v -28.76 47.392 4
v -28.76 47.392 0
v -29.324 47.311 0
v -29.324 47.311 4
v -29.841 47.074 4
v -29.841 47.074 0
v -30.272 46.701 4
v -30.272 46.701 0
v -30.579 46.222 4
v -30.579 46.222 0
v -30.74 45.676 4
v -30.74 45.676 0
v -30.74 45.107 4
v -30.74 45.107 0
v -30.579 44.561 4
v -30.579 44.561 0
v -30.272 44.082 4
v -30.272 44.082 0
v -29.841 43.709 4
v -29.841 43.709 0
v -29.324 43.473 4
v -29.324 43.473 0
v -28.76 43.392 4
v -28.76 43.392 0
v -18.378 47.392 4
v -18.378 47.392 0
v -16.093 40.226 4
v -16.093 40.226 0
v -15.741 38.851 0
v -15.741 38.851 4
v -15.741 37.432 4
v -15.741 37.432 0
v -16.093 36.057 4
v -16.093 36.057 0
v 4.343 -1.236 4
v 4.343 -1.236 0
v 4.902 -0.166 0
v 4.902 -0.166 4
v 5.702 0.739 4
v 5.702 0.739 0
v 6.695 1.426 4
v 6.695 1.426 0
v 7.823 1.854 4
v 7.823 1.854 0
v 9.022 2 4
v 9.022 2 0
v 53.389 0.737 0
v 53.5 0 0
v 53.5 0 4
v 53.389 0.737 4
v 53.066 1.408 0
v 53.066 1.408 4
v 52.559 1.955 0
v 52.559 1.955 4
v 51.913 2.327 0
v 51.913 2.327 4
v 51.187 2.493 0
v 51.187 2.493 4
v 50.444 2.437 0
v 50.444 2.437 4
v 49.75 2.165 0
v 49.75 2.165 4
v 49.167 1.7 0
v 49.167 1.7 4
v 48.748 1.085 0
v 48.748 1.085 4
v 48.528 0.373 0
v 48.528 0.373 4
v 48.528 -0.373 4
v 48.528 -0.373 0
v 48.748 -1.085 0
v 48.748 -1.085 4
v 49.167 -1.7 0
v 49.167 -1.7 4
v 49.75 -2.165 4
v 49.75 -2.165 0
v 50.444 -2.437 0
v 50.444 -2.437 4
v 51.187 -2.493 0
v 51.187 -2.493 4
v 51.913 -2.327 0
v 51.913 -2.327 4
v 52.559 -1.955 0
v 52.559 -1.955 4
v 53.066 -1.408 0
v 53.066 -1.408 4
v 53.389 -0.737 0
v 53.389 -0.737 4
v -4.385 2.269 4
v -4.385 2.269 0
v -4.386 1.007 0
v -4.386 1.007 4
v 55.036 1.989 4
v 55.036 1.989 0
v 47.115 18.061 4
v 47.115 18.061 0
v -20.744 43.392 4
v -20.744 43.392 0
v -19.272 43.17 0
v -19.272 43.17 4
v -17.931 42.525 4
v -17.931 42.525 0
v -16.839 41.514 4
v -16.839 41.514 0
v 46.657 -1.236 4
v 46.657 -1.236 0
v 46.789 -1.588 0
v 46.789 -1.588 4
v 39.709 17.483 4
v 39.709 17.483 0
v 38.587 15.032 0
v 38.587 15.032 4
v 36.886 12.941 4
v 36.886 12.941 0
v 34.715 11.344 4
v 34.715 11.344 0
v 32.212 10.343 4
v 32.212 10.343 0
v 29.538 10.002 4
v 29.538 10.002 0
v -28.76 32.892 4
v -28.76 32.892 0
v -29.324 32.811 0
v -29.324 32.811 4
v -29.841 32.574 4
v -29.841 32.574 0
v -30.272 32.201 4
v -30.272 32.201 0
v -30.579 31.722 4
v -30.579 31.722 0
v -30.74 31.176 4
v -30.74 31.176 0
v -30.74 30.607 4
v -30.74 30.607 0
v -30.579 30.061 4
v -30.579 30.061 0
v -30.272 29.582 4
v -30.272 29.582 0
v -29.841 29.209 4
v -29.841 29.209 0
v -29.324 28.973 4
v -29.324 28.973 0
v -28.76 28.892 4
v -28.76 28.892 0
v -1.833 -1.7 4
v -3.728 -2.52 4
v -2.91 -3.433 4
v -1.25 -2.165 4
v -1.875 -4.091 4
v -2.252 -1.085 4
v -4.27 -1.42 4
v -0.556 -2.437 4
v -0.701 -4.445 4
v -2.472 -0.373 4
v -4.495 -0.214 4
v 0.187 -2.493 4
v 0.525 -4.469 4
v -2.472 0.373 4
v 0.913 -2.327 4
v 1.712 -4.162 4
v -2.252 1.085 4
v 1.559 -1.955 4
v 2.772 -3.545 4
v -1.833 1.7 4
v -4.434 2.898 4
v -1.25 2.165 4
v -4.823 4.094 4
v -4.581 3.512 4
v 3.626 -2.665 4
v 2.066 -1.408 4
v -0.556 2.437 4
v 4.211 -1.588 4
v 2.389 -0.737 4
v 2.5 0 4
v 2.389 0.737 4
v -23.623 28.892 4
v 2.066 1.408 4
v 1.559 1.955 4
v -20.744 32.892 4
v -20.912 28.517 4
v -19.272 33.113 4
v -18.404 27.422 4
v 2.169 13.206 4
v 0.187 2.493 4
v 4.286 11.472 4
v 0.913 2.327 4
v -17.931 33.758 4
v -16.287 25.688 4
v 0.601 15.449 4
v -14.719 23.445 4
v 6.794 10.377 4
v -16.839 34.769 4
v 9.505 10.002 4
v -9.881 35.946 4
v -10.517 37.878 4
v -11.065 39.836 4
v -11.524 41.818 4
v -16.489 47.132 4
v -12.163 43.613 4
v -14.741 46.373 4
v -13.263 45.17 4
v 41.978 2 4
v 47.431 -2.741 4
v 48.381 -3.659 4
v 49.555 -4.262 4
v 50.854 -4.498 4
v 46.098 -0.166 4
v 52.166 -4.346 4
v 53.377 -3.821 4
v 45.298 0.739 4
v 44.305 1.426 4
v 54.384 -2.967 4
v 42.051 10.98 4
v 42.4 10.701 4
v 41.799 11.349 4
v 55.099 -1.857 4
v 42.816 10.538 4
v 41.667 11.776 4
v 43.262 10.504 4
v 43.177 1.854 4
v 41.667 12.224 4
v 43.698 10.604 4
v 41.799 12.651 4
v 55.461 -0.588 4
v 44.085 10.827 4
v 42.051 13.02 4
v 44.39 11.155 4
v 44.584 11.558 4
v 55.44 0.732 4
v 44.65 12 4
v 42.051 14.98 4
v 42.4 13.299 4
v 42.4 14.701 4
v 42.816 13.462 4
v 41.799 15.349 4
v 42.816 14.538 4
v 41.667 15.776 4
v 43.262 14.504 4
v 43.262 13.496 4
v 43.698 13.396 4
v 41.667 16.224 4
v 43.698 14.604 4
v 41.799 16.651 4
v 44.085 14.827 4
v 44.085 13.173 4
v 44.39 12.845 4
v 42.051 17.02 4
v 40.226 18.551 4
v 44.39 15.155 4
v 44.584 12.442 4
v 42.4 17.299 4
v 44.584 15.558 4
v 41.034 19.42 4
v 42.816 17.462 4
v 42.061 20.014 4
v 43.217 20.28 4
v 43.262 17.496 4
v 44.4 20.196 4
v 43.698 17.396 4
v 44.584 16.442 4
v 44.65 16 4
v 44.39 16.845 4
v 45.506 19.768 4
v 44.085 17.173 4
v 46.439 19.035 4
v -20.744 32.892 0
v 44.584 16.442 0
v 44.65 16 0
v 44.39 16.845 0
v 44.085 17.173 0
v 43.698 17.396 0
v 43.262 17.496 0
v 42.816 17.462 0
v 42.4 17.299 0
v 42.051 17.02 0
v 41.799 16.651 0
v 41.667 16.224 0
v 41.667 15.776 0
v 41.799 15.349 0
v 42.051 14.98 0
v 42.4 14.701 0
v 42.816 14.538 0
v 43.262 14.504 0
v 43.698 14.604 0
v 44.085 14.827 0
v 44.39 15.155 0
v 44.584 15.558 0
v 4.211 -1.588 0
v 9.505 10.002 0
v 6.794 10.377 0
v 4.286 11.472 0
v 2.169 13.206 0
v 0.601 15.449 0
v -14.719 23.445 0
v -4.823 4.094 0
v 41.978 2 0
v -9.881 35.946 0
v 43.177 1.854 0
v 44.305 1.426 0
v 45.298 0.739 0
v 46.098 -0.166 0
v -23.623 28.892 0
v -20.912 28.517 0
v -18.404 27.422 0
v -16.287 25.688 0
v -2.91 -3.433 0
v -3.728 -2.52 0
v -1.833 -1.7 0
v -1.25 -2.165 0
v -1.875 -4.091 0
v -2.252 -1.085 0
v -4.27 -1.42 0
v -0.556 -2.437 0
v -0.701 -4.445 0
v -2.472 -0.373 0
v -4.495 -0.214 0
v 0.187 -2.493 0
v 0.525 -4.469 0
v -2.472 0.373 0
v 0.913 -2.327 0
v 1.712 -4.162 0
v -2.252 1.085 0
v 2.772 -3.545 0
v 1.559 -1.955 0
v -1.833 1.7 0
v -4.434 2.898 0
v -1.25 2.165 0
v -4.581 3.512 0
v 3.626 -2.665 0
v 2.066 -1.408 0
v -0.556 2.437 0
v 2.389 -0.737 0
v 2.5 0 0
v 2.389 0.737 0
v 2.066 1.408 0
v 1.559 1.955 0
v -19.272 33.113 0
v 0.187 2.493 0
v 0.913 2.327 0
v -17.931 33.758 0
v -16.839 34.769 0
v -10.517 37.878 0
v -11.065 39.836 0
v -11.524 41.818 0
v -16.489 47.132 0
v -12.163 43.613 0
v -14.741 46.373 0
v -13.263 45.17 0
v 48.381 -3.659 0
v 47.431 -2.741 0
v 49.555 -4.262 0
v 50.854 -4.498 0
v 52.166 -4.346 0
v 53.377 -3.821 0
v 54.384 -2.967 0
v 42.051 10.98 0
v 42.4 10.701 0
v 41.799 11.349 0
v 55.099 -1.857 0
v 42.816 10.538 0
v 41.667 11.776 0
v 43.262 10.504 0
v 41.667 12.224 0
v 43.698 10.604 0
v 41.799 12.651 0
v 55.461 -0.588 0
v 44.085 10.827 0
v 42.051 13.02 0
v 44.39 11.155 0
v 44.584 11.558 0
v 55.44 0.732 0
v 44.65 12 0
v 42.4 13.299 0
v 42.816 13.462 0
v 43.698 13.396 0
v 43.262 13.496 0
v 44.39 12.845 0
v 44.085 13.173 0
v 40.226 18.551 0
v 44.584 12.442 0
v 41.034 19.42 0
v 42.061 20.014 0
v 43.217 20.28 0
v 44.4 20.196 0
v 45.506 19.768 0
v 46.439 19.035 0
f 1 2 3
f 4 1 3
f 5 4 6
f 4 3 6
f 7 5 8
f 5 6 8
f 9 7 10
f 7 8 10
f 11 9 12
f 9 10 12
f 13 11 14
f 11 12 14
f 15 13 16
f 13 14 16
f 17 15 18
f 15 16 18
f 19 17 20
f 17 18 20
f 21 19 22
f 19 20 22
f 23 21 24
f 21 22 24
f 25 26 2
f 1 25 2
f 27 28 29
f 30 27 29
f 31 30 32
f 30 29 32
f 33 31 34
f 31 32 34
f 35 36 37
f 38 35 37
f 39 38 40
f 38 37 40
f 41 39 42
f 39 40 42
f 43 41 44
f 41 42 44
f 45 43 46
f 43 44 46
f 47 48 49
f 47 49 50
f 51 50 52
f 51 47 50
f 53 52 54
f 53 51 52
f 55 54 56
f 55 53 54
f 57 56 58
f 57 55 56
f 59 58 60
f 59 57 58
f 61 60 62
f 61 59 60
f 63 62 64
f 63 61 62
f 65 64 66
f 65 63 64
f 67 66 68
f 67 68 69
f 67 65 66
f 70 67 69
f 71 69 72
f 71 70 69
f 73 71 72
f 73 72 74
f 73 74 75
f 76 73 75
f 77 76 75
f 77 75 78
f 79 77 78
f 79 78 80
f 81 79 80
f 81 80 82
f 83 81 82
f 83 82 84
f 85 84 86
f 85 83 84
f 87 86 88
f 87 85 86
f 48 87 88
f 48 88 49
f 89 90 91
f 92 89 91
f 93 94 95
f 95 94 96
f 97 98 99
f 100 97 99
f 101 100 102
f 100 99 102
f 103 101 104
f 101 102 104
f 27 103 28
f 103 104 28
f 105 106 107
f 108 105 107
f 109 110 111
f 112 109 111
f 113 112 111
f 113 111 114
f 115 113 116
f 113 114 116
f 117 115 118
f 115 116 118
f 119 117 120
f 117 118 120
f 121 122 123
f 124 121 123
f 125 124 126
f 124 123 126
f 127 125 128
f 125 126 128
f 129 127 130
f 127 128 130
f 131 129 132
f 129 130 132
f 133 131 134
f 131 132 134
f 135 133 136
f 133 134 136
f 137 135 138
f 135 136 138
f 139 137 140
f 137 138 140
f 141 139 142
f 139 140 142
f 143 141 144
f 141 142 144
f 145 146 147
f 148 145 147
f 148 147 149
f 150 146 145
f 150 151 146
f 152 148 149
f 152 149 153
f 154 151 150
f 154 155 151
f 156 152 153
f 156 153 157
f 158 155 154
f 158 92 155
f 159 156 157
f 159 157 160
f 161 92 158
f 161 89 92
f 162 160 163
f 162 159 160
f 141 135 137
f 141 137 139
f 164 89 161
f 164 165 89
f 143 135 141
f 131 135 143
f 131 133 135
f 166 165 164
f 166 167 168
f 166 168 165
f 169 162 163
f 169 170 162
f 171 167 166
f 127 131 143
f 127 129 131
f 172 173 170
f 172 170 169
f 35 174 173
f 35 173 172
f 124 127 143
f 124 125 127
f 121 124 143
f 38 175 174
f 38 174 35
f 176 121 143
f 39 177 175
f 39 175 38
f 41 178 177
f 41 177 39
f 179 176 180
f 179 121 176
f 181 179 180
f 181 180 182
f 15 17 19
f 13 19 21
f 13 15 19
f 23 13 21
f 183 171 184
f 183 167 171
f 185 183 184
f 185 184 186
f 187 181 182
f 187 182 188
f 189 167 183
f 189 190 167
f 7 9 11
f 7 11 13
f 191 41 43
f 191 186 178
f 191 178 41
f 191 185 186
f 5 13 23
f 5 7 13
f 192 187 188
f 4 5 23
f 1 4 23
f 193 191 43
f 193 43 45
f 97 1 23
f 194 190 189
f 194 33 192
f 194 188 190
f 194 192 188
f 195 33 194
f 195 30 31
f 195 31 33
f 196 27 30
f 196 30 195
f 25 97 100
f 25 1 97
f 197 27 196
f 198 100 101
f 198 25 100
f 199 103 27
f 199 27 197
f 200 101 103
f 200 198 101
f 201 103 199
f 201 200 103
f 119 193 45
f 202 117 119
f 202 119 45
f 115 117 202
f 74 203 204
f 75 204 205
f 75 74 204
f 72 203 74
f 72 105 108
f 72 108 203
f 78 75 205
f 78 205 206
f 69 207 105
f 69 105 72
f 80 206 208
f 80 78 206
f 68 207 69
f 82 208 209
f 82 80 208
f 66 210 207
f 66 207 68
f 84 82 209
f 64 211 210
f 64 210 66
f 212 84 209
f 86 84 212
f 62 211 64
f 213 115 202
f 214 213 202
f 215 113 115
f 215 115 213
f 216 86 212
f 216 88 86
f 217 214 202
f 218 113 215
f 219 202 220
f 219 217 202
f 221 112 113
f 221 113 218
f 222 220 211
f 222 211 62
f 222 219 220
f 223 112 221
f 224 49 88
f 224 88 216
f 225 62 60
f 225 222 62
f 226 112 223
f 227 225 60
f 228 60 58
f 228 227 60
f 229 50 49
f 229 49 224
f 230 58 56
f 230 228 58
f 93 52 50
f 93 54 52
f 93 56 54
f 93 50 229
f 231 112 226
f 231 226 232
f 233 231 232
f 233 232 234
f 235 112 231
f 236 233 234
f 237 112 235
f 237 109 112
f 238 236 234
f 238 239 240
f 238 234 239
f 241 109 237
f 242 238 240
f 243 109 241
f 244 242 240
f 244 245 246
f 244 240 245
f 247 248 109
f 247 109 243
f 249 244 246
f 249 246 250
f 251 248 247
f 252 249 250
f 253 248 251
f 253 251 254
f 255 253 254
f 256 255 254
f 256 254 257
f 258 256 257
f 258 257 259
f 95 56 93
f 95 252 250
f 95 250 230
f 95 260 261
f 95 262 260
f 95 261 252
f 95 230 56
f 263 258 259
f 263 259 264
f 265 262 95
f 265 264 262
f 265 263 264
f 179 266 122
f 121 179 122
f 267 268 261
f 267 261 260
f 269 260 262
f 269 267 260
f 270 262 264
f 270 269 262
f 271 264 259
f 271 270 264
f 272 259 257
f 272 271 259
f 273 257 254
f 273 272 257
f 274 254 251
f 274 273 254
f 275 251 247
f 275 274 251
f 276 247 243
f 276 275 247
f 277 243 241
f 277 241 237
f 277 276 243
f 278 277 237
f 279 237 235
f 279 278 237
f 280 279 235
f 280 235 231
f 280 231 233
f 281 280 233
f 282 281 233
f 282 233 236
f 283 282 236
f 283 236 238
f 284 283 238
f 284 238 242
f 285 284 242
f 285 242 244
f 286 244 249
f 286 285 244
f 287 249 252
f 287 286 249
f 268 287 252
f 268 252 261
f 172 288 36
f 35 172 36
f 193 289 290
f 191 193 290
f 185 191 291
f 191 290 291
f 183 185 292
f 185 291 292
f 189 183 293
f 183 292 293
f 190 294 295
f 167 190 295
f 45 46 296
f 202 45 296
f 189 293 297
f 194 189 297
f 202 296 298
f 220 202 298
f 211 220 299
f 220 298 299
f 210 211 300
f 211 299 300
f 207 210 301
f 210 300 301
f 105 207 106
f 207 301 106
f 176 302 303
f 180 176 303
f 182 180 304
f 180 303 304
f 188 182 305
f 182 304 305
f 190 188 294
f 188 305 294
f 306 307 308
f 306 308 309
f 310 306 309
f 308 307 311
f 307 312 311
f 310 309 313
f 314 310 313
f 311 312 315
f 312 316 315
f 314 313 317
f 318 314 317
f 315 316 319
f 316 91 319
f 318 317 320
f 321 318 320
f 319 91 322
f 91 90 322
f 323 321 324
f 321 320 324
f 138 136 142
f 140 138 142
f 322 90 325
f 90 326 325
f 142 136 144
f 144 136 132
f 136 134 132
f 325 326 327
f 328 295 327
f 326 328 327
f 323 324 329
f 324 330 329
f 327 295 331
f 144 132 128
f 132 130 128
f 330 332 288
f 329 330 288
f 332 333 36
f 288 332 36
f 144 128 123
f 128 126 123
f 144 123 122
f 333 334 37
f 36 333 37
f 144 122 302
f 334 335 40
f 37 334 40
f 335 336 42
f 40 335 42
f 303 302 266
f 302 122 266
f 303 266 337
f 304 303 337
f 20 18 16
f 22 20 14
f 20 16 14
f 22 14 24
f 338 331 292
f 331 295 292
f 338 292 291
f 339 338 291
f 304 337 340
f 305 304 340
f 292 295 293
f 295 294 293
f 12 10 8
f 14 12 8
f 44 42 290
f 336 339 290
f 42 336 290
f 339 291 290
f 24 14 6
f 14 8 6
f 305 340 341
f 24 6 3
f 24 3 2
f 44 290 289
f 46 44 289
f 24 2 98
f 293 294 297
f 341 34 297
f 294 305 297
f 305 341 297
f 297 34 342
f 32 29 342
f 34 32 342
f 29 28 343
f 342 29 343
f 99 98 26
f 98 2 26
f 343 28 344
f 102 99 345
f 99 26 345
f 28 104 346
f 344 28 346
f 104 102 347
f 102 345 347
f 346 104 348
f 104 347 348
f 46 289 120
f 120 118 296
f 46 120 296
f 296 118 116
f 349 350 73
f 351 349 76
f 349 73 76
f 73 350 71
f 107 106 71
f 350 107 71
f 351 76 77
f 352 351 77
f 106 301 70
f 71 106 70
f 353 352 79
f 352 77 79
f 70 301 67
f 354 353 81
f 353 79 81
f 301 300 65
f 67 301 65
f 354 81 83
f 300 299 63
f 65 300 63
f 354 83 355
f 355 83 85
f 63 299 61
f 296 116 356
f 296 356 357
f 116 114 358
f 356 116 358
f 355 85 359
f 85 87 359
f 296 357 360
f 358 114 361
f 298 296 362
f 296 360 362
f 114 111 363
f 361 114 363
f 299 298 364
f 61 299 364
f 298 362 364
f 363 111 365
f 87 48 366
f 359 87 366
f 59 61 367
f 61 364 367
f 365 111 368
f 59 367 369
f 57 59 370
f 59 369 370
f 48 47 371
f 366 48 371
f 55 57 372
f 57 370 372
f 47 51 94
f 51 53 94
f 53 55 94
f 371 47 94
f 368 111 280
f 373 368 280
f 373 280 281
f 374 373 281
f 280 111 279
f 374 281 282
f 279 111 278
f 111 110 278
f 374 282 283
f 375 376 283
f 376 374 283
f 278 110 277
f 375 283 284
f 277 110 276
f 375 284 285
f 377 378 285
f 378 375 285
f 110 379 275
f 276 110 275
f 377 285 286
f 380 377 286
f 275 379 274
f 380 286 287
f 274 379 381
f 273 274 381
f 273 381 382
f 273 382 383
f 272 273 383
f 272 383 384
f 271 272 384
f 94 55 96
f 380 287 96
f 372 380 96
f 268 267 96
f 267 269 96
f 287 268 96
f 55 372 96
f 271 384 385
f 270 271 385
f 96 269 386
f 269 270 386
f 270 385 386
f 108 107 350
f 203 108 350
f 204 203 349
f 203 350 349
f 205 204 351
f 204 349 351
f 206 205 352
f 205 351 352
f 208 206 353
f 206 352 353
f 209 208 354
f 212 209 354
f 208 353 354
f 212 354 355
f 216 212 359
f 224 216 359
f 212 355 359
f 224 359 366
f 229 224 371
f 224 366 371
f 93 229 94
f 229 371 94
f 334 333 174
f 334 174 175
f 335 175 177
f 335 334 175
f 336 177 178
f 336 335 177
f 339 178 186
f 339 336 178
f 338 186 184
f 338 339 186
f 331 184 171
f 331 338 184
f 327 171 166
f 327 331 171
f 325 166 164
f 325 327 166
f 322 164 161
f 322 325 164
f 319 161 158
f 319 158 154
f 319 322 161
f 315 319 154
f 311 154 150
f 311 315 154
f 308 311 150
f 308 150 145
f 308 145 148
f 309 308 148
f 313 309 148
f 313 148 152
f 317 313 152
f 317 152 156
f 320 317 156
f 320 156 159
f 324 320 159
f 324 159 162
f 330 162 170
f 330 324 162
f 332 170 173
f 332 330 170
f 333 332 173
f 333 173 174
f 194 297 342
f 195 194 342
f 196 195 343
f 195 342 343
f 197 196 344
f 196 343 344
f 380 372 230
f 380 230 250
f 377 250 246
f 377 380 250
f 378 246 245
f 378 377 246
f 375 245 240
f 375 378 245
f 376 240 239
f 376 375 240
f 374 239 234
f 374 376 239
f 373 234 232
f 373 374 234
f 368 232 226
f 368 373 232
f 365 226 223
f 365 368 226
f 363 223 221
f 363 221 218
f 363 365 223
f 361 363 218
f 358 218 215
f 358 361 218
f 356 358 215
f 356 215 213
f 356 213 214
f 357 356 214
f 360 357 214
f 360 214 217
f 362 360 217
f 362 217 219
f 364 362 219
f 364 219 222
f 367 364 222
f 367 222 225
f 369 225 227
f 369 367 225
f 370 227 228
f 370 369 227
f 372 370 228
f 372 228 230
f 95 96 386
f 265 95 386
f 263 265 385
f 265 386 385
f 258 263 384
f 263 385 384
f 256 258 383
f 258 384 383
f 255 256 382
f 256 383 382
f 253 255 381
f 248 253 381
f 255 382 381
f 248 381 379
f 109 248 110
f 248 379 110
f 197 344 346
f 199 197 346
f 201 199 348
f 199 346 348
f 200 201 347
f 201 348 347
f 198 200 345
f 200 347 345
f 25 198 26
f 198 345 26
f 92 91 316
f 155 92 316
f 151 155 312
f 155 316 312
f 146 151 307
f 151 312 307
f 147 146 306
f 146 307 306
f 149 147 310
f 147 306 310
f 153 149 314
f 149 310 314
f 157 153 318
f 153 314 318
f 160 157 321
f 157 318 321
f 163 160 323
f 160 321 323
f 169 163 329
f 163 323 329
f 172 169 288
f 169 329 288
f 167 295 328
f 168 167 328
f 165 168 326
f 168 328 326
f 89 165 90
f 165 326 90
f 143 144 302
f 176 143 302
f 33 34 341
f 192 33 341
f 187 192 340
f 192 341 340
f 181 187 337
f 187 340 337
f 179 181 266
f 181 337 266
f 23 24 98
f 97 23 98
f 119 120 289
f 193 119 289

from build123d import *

# Parameters (mm, degrees)
SKETCH1_R           = 2.5
SKETCH1_R_2         = 1.5
BOSS_EXTRUDE1_DEPTH = 4


with BuildPart() as part:
    # Sketch1 → Boss-Extrude1 (new body)
    with BuildSketch(Plane.XY):
        with BuildLine():
            Line((9.021718503, 2), (41.978281497, 2))
            ThreePointArc((41.978281497, 2), (44.822515117, 1.112217786), (46.656724728, -1.235865953))
            Line((46.656724728, -1.235865953), (46.789401092, -1.587720642))
            ThreePointArc((46.789401092, -1.587720642), (52.790694487, -4.128366899), (55.036357188, 1.989427216))
            Line((55.036357188, 1.989427216), (47.115238631, 18.060617738))
            ThreePointArc((47.115238631, 18.060617738), (43.216566444, 20.280145198), (39.708839684, 17.483397096))
            ThreePointArc((39.708839684, 17.483397096), (35.851166353, 12.07387553), (29.538291134, 10.002119376))
            Line((29.538291134, 10.002119376), (9.504810122, 10.002119376))
            ThreePointArc((9.504810122, 10.002119376), (4.286155076, 11.471841566), (0.601494655, 15.448991475))
            Line((0.601494655, 15.448991475), (-9.880645528, 35.94606576))
            ThreePointArc((-9.880645528, 35.94606576), (-10.802085001, 38.853975504), (-11.524402661, 41.817629833))
            ThreePointArc((-11.524402661, 41.817629833), (-13.960734342, 45.822125323), (-18.377595021, 47.391532194))
            Line((-18.377595021, 47.391532194), (-28.76016905, 47.391532194))
            ThreePointArc((-28.76016905, 47.391532194), (-30.76016905, 45.391532194), (-28.76016905, 43.391532194))
            Line((-28.76016905, 43.391532194), (-20.743770069, 43.391532194))
            ThreePointArc((-20.743770069, 43.391532194), (-17.93067591, 42.525114327), (-16.092507767, 40.226132695))
            ThreePointArc((-16.092507767, 40.226132695), (-15.696247775, 38.141532194), (-16.092507767, 36.056931692))
            ThreePointArc((-16.092507767, 36.056931692), (-17.93067591, 33.75795006), (-20.743770069, 32.891532194))
            Line((-20.743770069, 32.891532194), (-23.62255188, 32.891532194))
            Line((-23.62255188, 32.891532194), (-28.76016905, 32.891532194))
            ThreePointArc((-28.76016905, 32.891532194), (-30.76016905, 30.891532194), (-28.76016905, 28.891532194))
            Line((-28.76016905, 28.891532194), (-23.62255188, 28.891532194))
            ThreePointArc((-23.62255188, 28.891532194), (-18.403896833, 27.421810003), (-14.719236412, 23.444660095))
            Line((-14.719236412, 23.444660095), (-4.823396458, 4.094053908))
            ThreePointArc((-4.823396458, 4.094053908), (-4.495519345, 3.207734666), (-4.38472424, 2.269230727))
            Line((-4.38472424, 2.269230727), (-4.385851303, 1.007128763))
            ThreePointArc((-4.385851303, 1.007128763), (-1.300380409, -4.308017037), (4.210598908, -1.587720642))
            Line((4.210598908, -1.587720642), (4.343275272, -1.235865953))
            ThreePointArc((4.343275272, -1.235865953), (6.177484883, 1.112217786), (9.021718503, 2))
        make_face()
        Circle(SKETCH1_R, mode=Mode.SUBTRACT)
        with Locations((51, 0)):
            Circle(SKETCH1_R, mode=Mode.SUBTRACT)
        with Locations((43.150236609, 12)):
            Circle(SKETCH1_R_2, mode=Mode.SUBTRACT)
        with Locations((43.150236609, 16)):
            Circle(SKETCH1_R_2, mode=Mode.SUBTRACT)
    extrude(amount=BOSS_EXTRUDE1_DEPTH)


solid = part.part
